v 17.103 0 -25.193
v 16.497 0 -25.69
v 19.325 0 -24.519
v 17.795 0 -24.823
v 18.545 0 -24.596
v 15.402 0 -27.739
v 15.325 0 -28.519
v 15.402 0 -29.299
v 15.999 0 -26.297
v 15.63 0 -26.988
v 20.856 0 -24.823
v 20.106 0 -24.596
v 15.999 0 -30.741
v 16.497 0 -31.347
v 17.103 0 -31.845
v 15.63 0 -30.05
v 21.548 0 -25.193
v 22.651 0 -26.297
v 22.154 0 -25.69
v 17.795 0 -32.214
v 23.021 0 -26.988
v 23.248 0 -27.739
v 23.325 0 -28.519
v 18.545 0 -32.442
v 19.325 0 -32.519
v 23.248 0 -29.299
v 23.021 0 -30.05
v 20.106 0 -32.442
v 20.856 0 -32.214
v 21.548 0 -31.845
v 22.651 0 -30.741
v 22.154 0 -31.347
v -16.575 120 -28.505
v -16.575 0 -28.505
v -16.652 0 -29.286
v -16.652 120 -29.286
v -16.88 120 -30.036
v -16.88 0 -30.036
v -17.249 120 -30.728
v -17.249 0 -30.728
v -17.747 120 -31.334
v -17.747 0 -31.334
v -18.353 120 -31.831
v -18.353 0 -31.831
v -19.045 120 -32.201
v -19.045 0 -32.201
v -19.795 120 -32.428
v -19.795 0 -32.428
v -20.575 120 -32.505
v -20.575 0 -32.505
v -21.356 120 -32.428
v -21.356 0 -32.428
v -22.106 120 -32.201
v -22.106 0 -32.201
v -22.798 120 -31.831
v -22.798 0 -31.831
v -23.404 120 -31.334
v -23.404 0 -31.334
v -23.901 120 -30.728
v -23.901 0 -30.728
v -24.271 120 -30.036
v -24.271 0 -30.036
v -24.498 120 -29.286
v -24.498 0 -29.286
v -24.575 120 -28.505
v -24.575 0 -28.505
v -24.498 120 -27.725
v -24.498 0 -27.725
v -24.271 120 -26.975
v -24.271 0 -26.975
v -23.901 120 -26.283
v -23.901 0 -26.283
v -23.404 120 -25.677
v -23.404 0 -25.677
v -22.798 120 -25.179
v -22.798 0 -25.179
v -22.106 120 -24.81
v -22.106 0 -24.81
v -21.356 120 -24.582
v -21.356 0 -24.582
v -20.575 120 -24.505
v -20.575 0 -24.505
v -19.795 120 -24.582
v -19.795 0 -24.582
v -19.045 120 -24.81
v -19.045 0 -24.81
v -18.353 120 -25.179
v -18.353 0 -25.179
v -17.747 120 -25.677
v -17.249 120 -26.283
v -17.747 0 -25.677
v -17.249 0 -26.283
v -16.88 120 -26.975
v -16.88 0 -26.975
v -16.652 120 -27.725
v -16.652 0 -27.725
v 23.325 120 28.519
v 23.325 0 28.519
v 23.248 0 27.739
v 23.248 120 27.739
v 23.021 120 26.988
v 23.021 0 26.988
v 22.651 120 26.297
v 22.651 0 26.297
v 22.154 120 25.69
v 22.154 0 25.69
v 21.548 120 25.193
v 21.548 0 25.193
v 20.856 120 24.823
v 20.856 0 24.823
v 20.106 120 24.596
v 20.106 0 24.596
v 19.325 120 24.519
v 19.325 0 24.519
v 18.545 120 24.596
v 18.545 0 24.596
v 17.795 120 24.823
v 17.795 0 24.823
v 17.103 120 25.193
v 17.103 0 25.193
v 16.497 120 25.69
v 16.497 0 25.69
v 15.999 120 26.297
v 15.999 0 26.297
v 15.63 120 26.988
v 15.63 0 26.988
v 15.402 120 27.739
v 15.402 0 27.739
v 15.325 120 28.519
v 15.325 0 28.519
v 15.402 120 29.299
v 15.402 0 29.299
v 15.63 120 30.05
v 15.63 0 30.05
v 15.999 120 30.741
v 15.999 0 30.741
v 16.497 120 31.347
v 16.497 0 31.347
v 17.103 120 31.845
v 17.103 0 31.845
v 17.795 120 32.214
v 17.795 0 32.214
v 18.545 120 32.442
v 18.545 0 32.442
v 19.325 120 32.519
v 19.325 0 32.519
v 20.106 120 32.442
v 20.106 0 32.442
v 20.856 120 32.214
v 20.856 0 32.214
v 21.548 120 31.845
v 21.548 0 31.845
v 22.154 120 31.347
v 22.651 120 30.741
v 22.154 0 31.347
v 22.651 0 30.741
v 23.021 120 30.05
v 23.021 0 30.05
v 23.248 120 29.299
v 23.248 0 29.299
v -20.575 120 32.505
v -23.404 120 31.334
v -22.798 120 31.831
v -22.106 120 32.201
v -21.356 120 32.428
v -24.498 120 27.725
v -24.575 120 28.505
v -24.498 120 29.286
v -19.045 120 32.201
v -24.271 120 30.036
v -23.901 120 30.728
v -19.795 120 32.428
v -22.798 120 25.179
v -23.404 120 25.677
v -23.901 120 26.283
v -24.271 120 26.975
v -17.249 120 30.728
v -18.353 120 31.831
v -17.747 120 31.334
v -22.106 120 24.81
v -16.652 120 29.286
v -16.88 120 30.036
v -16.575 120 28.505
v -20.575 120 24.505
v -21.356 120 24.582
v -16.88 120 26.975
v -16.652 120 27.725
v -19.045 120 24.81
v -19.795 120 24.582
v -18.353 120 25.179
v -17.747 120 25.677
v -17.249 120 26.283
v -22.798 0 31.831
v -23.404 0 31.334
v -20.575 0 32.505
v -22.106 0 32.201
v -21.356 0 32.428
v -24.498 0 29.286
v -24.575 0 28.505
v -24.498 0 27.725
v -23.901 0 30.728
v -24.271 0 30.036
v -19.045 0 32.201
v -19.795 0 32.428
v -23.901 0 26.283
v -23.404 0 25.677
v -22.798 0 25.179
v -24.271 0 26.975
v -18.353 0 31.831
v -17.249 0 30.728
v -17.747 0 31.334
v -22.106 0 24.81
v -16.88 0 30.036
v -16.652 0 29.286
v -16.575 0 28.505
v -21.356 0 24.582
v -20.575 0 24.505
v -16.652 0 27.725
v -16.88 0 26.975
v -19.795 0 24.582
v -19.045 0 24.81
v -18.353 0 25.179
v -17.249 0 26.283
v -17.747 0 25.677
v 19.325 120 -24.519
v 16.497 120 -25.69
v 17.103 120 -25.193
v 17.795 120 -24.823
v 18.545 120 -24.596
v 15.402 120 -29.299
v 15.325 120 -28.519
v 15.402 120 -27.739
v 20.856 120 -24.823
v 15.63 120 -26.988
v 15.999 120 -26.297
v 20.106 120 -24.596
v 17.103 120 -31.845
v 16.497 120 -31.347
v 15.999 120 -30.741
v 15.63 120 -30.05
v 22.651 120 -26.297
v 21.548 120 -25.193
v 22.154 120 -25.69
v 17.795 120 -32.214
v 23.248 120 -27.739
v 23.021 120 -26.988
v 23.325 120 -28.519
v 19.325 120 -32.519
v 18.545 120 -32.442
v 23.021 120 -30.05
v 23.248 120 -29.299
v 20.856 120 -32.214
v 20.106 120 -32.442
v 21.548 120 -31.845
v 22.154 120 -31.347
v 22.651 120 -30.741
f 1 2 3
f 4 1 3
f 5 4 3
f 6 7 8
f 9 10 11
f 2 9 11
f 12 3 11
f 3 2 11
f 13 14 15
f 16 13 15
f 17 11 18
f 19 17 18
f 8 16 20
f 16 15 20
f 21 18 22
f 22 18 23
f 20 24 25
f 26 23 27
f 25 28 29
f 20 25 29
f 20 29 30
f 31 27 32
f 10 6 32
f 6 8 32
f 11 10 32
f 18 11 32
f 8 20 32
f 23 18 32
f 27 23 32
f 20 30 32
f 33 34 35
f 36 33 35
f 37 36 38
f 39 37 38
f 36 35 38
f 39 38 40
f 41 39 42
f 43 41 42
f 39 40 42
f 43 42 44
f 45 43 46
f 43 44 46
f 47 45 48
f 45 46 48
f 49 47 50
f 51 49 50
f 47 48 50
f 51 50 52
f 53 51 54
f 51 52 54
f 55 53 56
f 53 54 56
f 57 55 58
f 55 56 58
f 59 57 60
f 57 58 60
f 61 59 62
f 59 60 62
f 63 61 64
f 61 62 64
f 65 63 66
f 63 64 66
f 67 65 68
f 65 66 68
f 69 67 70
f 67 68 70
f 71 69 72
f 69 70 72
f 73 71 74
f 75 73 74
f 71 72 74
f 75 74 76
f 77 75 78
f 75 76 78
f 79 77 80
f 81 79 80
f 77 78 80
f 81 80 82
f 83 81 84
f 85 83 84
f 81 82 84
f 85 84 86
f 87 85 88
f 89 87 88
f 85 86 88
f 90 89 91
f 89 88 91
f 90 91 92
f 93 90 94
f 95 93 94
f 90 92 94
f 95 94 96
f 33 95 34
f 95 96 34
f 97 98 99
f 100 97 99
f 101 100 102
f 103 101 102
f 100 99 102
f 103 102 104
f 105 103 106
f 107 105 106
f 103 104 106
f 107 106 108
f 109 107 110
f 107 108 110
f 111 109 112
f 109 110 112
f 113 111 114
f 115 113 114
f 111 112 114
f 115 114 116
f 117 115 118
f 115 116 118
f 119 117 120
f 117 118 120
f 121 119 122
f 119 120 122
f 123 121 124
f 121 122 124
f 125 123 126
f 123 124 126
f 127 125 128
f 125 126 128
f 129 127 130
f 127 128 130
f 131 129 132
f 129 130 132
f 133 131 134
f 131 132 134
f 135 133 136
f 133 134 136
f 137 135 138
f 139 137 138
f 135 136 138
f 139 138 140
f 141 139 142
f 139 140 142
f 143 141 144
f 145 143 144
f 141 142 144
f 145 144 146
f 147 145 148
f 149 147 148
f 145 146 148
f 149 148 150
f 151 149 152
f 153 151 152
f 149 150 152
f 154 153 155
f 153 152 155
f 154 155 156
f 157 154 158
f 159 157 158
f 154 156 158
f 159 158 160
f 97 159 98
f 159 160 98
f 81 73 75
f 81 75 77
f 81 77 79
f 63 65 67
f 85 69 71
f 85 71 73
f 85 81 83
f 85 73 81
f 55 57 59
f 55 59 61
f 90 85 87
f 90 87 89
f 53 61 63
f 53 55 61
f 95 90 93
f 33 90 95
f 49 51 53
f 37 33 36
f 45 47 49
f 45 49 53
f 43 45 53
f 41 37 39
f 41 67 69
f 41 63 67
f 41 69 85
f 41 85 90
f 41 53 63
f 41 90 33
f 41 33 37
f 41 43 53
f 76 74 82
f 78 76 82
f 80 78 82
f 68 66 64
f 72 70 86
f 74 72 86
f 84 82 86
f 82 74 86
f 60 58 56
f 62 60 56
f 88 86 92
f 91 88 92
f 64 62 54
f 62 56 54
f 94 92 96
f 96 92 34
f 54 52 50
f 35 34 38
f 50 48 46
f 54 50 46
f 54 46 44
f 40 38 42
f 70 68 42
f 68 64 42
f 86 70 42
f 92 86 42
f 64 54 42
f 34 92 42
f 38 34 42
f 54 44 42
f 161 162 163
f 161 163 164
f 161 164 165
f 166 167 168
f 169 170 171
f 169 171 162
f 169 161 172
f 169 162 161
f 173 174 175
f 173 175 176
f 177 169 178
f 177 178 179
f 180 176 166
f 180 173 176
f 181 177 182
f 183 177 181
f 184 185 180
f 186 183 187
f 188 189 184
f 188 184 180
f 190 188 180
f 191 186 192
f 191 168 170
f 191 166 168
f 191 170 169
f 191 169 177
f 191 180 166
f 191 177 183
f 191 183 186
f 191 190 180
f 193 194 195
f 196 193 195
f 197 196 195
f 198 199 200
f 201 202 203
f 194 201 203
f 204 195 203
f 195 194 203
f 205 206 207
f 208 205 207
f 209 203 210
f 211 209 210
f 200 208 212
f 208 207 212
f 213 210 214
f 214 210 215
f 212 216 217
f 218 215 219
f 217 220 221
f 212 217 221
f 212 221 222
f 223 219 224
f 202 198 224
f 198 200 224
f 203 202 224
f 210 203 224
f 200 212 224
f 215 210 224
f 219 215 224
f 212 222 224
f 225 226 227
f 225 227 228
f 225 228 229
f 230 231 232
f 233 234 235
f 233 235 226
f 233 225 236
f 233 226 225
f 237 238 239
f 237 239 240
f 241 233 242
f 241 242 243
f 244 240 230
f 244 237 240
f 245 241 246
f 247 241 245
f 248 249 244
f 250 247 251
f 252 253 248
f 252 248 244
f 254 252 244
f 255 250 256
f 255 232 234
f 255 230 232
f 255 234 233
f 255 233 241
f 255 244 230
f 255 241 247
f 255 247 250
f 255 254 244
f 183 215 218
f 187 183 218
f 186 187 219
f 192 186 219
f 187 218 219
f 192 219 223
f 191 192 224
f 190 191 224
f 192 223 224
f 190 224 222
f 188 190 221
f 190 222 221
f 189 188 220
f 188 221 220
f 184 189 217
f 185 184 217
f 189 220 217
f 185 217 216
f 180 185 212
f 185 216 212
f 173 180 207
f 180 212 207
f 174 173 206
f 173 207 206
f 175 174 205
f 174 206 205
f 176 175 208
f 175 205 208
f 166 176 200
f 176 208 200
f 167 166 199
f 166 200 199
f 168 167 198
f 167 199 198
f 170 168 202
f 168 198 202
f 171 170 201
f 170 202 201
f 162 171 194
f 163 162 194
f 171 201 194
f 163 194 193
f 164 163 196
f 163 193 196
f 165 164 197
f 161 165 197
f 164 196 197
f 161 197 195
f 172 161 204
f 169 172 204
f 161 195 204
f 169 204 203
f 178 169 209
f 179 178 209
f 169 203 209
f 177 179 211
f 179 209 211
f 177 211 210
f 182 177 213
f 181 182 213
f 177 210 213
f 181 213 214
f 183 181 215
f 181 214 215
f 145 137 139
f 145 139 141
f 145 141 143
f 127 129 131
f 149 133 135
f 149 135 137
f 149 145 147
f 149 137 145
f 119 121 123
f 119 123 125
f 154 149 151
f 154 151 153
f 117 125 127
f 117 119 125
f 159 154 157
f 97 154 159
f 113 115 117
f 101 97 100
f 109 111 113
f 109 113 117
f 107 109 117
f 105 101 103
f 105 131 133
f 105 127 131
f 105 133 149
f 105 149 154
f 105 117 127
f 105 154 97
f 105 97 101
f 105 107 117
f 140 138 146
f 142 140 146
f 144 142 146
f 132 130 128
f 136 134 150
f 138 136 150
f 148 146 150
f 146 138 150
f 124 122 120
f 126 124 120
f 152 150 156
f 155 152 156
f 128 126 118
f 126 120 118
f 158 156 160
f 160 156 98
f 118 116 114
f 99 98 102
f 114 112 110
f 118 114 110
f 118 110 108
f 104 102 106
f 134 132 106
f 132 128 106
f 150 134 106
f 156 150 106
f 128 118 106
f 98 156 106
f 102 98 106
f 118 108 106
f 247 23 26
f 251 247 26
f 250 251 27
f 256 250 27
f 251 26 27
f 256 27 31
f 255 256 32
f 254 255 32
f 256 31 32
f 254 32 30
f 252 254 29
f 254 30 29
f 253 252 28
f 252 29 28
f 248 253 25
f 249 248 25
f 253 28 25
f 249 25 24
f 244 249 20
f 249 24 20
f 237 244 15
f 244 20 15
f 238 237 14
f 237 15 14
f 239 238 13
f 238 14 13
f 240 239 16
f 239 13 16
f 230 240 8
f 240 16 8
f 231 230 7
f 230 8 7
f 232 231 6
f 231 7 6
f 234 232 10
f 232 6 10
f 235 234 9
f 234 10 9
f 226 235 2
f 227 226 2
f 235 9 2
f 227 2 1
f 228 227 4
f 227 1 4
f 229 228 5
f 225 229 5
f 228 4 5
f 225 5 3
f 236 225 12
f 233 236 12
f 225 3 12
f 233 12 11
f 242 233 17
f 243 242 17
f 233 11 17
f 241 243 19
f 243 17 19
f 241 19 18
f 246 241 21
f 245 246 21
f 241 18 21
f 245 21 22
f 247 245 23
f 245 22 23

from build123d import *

# Parameters (mm, degrees)
SKETCH2_R             = 4
BOSS_EXTRUDE1_DEPTH   = 120
BOSS_EXTRUDE1_2_DEPTH = 120
BOSS_EXTRUDE1_3_DEPTH = 120
BOSS_EXTRUDE1_4_DEPTH = 120


with BuildPart() as part:
    # Sketch2 → Boss-Extrude1 (new body)
    with BuildSketch(Plane(origin=(0, 0, 0), x_dir=(1, 0, 0), z_dir=(0, 1, 0))):
        with Locations((19.325260187, 28.518864445)):
            Circle(SKETCH2_R)
    extrude(amount=BOSS_EXTRUDE1_DEPTH)


with BuildPart() as body_2:
    # Sketch2 → Boss-Extrude1 2 (new body)
    with BuildSketch(Plane(origin=(0, 0, 0), x_dir=(1, 0, 0), z_dir=(0, 1, 0))):
        with Locations((-20.575260187, 28.505316266)):
            Circle(SKETCH2_R)
    extrude(amount=BOSS_EXTRUDE1_2_DEPTH)


with BuildPart() as body_3:
    # Sketch2 → Boss-Extrude1 3 (new body)
    with BuildSketch(Plane(origin=(0, 0, 0), x_dir=(1, 0, 0), z_dir=(0, 1, 0))):
        with Locations((19.325260187, -28.518864445)):
            Circle(SKETCH2_R)
    extrude(amount=BOSS_EXTRUDE1_3_DEPTH)


with BuildPart() as body_4:
    # Sketch2 → Boss-Extrude1 4 (new body)
    with BuildSketch(Plane(origin=(0, 0, 0), x_dir=(1, 0, 0), z_dir=(0, 1, 0))):
        with Locations((-20.575260187, -28.505316266)):
            Circle(SKETCH2_R)
    extrude(amount=BOSS_EXTRUDE1_4_DEPTH)


solid = Compound([part.part, body_2.part, body_3.part, body_4.part])
